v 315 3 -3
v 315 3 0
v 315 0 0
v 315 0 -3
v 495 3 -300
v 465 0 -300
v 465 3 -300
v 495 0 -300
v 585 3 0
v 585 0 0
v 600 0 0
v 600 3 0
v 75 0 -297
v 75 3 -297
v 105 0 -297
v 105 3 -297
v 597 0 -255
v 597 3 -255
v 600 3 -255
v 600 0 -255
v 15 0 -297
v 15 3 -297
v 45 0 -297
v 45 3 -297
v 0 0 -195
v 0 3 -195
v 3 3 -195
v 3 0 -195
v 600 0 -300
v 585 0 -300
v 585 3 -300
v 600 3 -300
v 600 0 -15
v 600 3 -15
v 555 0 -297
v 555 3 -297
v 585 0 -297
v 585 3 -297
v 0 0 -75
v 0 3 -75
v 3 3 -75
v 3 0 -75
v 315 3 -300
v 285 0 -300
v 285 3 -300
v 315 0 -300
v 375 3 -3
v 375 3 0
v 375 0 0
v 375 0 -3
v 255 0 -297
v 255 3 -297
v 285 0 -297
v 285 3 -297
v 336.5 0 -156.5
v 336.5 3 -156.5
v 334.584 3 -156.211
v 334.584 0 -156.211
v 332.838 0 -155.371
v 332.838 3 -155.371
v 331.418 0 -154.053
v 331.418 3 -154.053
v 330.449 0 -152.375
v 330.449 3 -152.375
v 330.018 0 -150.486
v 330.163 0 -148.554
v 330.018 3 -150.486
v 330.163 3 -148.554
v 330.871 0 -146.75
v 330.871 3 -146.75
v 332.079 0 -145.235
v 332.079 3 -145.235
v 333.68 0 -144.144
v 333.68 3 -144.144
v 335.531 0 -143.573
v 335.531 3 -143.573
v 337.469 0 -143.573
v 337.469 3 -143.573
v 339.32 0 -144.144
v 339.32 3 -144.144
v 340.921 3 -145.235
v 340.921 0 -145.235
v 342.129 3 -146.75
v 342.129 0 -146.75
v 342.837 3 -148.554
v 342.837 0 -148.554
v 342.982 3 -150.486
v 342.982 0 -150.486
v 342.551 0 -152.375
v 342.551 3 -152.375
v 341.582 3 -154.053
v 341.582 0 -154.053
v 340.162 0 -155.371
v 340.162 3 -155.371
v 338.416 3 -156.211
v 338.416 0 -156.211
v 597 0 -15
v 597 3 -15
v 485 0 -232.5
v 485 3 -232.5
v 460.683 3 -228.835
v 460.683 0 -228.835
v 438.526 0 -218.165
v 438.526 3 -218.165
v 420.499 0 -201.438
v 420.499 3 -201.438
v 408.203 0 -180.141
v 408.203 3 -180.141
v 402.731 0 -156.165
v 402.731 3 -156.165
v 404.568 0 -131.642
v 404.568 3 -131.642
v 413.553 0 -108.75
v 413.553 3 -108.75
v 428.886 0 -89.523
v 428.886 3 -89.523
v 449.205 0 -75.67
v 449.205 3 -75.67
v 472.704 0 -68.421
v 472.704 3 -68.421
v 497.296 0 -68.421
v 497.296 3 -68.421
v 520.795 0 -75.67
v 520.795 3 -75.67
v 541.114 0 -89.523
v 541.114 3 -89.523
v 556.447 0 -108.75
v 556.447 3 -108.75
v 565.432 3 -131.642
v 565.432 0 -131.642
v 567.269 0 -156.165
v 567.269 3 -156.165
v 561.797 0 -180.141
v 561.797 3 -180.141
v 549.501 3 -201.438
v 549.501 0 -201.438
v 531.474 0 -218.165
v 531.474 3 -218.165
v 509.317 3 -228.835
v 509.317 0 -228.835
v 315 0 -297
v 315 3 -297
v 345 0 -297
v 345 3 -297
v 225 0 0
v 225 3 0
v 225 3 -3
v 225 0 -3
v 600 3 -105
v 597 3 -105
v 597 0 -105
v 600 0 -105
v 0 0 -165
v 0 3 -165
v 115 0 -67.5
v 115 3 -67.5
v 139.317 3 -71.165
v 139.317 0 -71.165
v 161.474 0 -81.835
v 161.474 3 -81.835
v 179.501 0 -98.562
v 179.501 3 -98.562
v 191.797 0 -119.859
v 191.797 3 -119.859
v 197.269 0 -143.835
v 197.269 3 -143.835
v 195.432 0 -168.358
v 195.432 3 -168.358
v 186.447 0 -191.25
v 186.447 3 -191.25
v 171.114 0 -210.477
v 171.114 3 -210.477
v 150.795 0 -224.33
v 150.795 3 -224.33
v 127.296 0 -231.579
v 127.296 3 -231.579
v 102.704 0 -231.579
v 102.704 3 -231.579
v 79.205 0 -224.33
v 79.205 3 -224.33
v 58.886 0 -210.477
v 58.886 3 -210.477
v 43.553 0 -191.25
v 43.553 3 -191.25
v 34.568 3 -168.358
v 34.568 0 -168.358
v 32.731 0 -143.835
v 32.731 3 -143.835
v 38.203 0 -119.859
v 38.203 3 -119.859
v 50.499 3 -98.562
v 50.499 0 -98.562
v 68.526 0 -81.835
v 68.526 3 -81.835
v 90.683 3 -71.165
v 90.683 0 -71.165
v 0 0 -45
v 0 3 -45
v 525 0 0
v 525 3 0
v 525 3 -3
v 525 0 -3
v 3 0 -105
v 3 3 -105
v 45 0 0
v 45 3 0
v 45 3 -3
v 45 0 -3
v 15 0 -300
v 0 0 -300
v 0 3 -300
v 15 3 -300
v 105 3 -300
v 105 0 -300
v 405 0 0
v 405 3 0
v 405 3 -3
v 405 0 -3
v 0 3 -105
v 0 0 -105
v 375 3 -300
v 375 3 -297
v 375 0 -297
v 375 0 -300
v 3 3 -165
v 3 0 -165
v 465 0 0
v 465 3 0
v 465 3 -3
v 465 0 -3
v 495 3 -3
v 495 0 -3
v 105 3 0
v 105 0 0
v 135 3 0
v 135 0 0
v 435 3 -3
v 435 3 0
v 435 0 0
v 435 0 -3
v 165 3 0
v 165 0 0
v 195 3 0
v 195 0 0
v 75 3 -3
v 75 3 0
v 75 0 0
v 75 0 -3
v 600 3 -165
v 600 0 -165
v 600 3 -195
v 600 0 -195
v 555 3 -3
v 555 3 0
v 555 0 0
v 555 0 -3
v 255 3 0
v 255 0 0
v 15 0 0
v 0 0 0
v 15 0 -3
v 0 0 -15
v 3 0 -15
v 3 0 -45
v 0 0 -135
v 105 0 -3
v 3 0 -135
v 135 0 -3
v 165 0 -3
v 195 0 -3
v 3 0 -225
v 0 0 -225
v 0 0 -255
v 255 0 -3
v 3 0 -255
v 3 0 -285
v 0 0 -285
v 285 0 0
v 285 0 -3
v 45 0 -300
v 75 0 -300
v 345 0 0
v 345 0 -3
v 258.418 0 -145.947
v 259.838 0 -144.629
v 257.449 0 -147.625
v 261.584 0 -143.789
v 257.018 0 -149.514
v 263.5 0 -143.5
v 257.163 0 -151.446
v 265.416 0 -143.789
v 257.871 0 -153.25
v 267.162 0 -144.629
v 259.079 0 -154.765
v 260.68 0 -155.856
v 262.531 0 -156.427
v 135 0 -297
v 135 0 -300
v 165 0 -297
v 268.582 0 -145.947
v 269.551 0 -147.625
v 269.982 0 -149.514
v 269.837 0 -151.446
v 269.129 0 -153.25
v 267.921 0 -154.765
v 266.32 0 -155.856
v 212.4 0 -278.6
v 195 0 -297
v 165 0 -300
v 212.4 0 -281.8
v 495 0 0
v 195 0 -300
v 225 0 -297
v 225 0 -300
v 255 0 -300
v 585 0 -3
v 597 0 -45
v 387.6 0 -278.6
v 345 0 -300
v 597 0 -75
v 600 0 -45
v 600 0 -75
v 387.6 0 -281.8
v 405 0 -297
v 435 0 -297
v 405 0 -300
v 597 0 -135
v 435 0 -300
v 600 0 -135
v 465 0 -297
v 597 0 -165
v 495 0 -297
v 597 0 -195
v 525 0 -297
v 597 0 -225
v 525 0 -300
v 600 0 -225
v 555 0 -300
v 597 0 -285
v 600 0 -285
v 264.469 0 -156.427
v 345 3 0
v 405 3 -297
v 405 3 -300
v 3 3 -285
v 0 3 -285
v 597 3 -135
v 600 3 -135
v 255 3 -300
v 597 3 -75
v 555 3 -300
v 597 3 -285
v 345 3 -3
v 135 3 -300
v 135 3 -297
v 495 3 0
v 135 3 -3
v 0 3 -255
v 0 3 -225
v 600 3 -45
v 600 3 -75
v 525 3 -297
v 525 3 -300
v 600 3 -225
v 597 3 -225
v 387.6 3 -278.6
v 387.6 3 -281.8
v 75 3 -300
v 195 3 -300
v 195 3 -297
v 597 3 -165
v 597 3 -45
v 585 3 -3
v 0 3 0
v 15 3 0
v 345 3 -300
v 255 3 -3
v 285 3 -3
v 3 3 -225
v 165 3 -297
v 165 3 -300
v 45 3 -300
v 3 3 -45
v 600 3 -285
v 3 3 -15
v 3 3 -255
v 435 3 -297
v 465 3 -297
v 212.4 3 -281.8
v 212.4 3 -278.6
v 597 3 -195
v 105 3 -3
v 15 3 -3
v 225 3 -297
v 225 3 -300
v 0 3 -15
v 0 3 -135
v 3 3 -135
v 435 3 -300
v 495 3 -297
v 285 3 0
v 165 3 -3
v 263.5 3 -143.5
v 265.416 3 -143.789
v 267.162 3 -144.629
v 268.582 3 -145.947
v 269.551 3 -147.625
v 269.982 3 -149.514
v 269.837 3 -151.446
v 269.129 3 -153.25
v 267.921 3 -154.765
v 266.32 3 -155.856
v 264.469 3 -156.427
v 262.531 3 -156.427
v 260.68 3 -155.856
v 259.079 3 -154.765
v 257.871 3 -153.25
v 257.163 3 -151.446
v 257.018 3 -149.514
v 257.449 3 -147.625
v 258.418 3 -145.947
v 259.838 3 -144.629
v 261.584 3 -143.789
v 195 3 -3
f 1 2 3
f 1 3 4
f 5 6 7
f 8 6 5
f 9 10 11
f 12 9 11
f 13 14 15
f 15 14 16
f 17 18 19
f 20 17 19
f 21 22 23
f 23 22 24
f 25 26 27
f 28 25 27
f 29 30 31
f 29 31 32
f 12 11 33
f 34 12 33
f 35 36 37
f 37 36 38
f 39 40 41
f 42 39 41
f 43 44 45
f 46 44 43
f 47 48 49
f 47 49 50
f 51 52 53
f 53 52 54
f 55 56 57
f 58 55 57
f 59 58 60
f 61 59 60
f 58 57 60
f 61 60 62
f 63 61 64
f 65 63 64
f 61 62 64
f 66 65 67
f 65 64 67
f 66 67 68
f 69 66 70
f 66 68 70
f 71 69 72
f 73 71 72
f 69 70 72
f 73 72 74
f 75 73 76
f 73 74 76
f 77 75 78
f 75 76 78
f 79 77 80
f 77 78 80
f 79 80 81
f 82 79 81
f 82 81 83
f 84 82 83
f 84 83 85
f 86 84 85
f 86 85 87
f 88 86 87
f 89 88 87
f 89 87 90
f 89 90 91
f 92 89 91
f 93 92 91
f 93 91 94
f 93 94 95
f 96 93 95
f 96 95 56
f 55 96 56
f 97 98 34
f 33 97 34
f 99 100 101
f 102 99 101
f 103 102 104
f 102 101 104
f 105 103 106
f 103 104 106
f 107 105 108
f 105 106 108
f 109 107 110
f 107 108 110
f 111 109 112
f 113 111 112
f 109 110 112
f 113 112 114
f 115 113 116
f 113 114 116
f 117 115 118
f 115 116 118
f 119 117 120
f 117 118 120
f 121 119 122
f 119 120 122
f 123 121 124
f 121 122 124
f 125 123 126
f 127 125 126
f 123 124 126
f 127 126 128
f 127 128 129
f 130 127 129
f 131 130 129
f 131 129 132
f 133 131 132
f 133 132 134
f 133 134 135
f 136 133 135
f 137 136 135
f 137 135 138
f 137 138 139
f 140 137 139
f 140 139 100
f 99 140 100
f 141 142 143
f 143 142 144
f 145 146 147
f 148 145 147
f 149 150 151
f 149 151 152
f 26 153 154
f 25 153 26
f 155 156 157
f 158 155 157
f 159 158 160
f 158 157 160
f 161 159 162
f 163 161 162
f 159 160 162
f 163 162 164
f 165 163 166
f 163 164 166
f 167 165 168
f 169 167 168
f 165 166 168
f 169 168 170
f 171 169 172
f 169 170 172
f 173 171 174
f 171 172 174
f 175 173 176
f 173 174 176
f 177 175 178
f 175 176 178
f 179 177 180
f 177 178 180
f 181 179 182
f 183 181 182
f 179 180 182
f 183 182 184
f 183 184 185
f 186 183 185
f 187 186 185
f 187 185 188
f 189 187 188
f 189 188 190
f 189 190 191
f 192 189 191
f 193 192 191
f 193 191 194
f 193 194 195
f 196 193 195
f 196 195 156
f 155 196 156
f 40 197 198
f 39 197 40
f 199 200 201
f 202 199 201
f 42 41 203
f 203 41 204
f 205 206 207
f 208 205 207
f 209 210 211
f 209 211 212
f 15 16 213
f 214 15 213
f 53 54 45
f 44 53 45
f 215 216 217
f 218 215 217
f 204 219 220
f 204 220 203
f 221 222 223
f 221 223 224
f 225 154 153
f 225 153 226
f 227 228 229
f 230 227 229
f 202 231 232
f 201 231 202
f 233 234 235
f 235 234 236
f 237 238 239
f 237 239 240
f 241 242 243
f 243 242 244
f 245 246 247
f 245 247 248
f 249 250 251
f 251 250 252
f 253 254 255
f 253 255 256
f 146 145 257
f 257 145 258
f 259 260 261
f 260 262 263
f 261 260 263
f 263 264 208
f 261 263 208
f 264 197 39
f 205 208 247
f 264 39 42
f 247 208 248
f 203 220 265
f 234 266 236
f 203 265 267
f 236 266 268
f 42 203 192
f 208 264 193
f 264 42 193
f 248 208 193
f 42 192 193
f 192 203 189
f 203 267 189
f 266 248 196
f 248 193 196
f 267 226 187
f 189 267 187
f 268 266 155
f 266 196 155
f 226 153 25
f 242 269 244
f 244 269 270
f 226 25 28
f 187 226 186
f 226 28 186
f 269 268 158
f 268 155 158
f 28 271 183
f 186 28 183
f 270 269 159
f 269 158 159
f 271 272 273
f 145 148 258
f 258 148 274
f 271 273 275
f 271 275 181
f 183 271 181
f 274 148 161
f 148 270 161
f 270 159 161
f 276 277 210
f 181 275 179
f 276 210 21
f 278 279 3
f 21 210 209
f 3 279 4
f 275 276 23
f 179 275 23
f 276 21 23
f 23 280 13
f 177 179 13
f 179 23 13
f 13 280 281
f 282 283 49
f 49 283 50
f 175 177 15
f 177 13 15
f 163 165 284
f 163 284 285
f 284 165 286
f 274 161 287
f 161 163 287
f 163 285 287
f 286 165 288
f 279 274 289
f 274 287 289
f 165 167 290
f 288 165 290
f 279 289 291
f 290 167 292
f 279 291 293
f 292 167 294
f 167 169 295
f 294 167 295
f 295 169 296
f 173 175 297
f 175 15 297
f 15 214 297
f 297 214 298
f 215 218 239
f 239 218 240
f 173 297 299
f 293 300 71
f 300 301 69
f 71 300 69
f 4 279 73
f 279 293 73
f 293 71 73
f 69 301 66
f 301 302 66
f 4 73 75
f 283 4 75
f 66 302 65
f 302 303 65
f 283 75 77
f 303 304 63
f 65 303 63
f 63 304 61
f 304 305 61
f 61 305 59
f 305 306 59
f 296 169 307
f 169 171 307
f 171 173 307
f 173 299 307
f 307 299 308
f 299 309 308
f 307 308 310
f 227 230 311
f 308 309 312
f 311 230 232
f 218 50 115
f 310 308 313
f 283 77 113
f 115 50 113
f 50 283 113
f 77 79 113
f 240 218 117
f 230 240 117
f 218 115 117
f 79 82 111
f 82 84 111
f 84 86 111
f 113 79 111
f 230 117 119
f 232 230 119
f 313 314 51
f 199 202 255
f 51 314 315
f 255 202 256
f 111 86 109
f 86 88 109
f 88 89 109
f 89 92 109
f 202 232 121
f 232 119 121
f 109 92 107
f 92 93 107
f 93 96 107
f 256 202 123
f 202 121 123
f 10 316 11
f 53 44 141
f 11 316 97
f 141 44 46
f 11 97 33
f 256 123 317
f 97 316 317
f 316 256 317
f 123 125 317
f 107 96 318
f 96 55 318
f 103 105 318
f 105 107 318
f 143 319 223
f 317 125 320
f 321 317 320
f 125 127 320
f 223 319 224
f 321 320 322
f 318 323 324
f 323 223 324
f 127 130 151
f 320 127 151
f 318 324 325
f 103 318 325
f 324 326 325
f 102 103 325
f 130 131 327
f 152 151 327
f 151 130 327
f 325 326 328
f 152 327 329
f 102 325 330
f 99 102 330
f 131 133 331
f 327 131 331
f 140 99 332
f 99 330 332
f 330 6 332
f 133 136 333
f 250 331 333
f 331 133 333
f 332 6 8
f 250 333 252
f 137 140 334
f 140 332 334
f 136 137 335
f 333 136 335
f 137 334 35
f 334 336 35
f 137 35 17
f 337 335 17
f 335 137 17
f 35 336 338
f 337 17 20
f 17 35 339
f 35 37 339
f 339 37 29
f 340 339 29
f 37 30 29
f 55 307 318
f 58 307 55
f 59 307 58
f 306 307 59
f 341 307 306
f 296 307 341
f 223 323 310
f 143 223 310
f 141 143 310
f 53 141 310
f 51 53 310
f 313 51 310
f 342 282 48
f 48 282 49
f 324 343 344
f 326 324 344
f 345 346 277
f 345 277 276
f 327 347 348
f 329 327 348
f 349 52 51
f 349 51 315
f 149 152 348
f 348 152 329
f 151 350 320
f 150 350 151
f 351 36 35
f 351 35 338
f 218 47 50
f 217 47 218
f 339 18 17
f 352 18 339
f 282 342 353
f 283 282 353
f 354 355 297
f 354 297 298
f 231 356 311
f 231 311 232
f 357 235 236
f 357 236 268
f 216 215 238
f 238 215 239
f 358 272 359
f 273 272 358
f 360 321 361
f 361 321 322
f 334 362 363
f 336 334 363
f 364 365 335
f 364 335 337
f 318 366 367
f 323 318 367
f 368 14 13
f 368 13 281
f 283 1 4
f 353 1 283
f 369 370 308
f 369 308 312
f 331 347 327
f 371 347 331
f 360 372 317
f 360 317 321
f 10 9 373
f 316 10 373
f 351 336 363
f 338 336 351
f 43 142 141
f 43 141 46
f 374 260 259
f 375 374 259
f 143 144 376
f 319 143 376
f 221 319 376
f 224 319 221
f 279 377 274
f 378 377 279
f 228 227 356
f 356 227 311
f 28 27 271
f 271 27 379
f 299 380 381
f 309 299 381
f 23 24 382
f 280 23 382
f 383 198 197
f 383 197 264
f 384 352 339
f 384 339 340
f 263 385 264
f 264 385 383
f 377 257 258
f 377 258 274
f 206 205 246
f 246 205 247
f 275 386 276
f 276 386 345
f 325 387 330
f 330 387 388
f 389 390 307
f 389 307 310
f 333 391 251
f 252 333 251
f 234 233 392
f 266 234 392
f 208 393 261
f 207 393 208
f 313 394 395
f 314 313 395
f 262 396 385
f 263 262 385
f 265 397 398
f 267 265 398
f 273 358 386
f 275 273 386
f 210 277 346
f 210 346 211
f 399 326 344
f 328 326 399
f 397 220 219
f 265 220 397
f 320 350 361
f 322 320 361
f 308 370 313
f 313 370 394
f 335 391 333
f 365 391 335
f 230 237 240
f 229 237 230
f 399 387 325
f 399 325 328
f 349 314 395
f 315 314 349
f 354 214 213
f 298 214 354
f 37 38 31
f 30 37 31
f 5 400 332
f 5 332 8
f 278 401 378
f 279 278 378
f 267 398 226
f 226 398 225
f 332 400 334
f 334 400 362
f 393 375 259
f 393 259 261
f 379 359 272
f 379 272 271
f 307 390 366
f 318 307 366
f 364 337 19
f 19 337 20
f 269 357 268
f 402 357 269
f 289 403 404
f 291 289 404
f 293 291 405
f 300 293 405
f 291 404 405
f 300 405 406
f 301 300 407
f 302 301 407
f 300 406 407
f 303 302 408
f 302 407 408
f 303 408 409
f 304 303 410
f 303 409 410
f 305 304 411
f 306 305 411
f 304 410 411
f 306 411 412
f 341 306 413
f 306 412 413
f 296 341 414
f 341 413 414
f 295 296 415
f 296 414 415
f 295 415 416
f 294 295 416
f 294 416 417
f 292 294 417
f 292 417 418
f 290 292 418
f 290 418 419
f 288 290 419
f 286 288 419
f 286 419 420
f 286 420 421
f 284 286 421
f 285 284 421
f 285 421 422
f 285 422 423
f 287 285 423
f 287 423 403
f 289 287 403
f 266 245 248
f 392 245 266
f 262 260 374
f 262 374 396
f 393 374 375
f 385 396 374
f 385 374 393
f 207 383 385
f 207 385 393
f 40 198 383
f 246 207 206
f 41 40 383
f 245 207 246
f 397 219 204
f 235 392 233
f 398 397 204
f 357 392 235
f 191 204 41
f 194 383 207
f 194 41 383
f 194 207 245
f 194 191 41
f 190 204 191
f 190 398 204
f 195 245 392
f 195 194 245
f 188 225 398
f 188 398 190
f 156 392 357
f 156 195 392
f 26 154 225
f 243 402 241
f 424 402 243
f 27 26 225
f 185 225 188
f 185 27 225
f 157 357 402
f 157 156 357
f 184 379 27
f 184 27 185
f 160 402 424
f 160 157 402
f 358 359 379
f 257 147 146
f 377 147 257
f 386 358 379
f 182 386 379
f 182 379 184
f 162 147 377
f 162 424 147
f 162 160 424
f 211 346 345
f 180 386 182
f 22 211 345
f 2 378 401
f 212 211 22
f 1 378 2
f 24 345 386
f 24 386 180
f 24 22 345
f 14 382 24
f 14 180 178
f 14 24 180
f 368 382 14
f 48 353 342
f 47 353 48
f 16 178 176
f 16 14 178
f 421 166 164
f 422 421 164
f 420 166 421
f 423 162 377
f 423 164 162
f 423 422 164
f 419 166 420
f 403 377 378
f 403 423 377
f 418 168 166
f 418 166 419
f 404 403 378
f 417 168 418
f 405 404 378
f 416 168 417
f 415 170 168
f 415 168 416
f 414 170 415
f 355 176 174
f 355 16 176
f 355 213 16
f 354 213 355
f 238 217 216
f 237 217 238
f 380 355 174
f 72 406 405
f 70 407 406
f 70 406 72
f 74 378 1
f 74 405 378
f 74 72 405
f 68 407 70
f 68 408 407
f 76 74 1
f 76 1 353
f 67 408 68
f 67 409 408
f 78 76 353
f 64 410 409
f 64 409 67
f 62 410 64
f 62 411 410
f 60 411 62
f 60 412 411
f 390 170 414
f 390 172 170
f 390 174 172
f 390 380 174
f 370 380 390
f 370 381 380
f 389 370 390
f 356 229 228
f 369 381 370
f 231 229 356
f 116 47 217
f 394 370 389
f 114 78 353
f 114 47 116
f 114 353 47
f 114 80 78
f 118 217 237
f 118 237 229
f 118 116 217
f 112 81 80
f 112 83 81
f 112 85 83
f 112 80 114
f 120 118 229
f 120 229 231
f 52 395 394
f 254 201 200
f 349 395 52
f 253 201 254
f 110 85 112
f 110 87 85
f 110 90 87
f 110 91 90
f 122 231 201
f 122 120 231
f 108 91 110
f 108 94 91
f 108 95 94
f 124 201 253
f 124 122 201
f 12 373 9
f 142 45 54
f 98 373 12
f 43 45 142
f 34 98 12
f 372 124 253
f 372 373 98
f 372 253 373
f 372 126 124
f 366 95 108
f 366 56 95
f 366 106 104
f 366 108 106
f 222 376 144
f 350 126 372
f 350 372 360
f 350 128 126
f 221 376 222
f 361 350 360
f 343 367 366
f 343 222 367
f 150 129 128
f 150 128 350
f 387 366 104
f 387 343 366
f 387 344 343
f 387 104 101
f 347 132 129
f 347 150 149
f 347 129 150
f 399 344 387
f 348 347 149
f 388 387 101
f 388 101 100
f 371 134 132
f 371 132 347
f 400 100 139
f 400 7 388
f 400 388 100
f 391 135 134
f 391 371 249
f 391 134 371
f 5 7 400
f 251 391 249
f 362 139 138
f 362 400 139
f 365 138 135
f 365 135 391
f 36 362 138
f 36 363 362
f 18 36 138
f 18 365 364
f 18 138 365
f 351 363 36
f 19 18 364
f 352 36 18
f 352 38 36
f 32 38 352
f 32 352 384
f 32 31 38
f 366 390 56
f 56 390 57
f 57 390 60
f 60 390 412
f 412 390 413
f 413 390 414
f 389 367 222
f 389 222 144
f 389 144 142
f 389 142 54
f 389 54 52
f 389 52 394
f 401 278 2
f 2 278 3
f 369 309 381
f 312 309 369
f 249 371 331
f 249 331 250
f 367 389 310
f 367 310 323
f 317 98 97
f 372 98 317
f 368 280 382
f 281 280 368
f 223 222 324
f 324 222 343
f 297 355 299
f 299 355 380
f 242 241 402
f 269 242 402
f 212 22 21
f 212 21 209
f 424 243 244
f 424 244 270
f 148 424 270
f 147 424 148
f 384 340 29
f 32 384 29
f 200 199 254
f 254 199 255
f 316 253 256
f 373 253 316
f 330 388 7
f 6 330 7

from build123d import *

# Parameters (mm, degrees)
SKETCH1_W           = 600
SKETCH1_H           = 300
BOSS_EXTRUDE1_DEPTH = 3
SKETCH2_R           = 82.5
SKETCH2_R_2         = 6.5
SKETCH2_W           = 30
SKETCH2_H           = 3
SKETCH2_W_2         = 3
SKETCH2_H_2         = 30
CUT_EXTRUDE2_DEPTH  = 5
SKETCH3_W           = 175.2
SKETCH3_H           = 3.2
CUT_EXTRUDE3_DEPTH  = 10


with BuildPart() as part:
    # Sketch1 → Boss-Extrude1 (new body)
    with BuildSketch(Plane(origin=(0, 0, 0), x_dir=(1, 0, 0), z_dir=(0, 1, 0))):
        with Locations((300, 150)):
            Rectangle(SKETCH1_W, SKETCH1_H)
    extrude(amount=BOSS_EXTRUDE1_DEPTH)

    # Sketch2 → Cut-Extrude2 (cut)
    with BuildSketch(Plane(origin=(0, 3, 0), x_dir=(1, 0, 0), z_dir=(0, 1, 0))):
        with Locations(Location((115, 150, 0), (0, 0, 270))):
            Circle(SKETCH2_R)
        with Locations(Location((263.5, 150, 0), (0, 0, 270))):
            Circle(SKETCH2_R_2)
        with Locations(Location((336.5, 150, 0), (0, 0, 90))):
            Circle(SKETCH2_R_2)
        with Locations(Location((485, 150, 0), (0, 0, 90))):
            Circle(SKETCH2_R)
        with Locations((90, 1.5)):
            Rectangle(SKETCH2_W, SKETCH2_H)
        with Locations((30, 1.5)):
            Rectangle(SKETCH2_W, SKETCH2_H)
        with Locations((150, 1.5)):
            Rectangle(SKETCH2_W, SKETCH2_H)
        with Locations((210, 1.5)):
            Rectangle(SKETCH2_W, SKETCH2_H)
        with Locations((270, 1.5)):
            Rectangle(SKETCH2_W, SKETCH2_H)
        with Locations((330, 1.5)):
            Rectangle(SKETCH2_W, SKETCH2_H)
        with Locations((390, 1.5)):
            Rectangle(SKETCH2_W, SKETCH2_H)
        with Locations((450, 1.5)):
            Rectangle(SKETCH2_W, SKETCH2_H)
        with Locations((510, 1.5)):
            Rectangle(SKETCH2_W, SKETCH2_H)
        with Locations((570, 1.5)):
            Rectangle(SKETCH2_W, SKETCH2_H)
        with Locations((570, 298.5)):
            Rectangle(SKETCH2_W, SKETCH2_H)
        with Locations((510, 298.5)):
            Rectangle(SKETCH2_W, SKETCH2_H)
        with Locations((450, 298.5)):
            Rectangle(SKETCH2_W, SKETCH2_H)
        with Locations((390, 298.5)):
            Rectangle(SKETCH2_W, SKETCH2_H)
        with Locations((330, 298.5)):
            Rectangle(SKETCH2_W, SKETCH2_H)
        with Locations((270, 298.5)):
            Rectangle(SKETCH2_W, SKETCH2_H)
        with Locations((210, 298.5)):
            Rectangle(SKETCH2_W, SKETCH2_H)
        with Locations((150, 298.5)):
            Rectangle(SKETCH2_W, SKETCH2_H)
        with Locations((90, 298.5)):
            Rectangle(SKETCH2_W, SKETCH2_H)
        with Locations((30, 298.5)):
            Rectangle(SKETCH2_W, SKETCH2_H)
        with Locations((1.5, 210)):
            Rectangle(SKETCH2_W_2, SKETCH2_H_2)
        with Locations((1.5, 270)):
            Rectangle(SKETCH2_W_2, SKETCH2_H_2)
        with Locations((1.5, 150)):
            Rectangle(SKETCH2_W_2, SKETCH2_H_2)
        with Locations((1.5, 90)):
            Rectangle(SKETCH2_W_2, SKETCH2_H_2)
        with Locations((1.5, 30)):
            Rectangle(SKETCH2_W_2, SKETCH2_H_2)
        with Locations((598.5, 30)):
            Rectangle(SKETCH2_W_2, SKETCH2_H_2)
        with Locations((598.5, 90)):
            Rectangle(SKETCH2_W_2, SKETCH2_H_2)
        with Locations((598.5, 150)):
            Rectangle(SKETCH2_W_2, SKETCH2_H_2)
        with Locations((598.5, 210)):
            Rectangle(SKETCH2_W_2, SKETCH2_H_2)
        with Locations((598.5, 270)):
            Rectangle(SKETCH2_W_2, SKETCH2_H_2)
    extrude(amount=-CUT_EXTRUDE2_DEPTH, mode=Mode.SUBTRACT)

    # Sketch3 → Cut-Extrude3 (cut)
    with BuildSketch(Plane(origin=(0, 3, 0), x_dir=(1, 0, 0), z_dir=(0, 1, 0))):
        with Locations((300, 280.2)):
            Rectangle(SKETCH3_W, SKETCH3_H)
    extrude(amount=-CUT_EXTRUDE3_DEPTH, mode=Mode.SUBTRACT)


solid = part.part
